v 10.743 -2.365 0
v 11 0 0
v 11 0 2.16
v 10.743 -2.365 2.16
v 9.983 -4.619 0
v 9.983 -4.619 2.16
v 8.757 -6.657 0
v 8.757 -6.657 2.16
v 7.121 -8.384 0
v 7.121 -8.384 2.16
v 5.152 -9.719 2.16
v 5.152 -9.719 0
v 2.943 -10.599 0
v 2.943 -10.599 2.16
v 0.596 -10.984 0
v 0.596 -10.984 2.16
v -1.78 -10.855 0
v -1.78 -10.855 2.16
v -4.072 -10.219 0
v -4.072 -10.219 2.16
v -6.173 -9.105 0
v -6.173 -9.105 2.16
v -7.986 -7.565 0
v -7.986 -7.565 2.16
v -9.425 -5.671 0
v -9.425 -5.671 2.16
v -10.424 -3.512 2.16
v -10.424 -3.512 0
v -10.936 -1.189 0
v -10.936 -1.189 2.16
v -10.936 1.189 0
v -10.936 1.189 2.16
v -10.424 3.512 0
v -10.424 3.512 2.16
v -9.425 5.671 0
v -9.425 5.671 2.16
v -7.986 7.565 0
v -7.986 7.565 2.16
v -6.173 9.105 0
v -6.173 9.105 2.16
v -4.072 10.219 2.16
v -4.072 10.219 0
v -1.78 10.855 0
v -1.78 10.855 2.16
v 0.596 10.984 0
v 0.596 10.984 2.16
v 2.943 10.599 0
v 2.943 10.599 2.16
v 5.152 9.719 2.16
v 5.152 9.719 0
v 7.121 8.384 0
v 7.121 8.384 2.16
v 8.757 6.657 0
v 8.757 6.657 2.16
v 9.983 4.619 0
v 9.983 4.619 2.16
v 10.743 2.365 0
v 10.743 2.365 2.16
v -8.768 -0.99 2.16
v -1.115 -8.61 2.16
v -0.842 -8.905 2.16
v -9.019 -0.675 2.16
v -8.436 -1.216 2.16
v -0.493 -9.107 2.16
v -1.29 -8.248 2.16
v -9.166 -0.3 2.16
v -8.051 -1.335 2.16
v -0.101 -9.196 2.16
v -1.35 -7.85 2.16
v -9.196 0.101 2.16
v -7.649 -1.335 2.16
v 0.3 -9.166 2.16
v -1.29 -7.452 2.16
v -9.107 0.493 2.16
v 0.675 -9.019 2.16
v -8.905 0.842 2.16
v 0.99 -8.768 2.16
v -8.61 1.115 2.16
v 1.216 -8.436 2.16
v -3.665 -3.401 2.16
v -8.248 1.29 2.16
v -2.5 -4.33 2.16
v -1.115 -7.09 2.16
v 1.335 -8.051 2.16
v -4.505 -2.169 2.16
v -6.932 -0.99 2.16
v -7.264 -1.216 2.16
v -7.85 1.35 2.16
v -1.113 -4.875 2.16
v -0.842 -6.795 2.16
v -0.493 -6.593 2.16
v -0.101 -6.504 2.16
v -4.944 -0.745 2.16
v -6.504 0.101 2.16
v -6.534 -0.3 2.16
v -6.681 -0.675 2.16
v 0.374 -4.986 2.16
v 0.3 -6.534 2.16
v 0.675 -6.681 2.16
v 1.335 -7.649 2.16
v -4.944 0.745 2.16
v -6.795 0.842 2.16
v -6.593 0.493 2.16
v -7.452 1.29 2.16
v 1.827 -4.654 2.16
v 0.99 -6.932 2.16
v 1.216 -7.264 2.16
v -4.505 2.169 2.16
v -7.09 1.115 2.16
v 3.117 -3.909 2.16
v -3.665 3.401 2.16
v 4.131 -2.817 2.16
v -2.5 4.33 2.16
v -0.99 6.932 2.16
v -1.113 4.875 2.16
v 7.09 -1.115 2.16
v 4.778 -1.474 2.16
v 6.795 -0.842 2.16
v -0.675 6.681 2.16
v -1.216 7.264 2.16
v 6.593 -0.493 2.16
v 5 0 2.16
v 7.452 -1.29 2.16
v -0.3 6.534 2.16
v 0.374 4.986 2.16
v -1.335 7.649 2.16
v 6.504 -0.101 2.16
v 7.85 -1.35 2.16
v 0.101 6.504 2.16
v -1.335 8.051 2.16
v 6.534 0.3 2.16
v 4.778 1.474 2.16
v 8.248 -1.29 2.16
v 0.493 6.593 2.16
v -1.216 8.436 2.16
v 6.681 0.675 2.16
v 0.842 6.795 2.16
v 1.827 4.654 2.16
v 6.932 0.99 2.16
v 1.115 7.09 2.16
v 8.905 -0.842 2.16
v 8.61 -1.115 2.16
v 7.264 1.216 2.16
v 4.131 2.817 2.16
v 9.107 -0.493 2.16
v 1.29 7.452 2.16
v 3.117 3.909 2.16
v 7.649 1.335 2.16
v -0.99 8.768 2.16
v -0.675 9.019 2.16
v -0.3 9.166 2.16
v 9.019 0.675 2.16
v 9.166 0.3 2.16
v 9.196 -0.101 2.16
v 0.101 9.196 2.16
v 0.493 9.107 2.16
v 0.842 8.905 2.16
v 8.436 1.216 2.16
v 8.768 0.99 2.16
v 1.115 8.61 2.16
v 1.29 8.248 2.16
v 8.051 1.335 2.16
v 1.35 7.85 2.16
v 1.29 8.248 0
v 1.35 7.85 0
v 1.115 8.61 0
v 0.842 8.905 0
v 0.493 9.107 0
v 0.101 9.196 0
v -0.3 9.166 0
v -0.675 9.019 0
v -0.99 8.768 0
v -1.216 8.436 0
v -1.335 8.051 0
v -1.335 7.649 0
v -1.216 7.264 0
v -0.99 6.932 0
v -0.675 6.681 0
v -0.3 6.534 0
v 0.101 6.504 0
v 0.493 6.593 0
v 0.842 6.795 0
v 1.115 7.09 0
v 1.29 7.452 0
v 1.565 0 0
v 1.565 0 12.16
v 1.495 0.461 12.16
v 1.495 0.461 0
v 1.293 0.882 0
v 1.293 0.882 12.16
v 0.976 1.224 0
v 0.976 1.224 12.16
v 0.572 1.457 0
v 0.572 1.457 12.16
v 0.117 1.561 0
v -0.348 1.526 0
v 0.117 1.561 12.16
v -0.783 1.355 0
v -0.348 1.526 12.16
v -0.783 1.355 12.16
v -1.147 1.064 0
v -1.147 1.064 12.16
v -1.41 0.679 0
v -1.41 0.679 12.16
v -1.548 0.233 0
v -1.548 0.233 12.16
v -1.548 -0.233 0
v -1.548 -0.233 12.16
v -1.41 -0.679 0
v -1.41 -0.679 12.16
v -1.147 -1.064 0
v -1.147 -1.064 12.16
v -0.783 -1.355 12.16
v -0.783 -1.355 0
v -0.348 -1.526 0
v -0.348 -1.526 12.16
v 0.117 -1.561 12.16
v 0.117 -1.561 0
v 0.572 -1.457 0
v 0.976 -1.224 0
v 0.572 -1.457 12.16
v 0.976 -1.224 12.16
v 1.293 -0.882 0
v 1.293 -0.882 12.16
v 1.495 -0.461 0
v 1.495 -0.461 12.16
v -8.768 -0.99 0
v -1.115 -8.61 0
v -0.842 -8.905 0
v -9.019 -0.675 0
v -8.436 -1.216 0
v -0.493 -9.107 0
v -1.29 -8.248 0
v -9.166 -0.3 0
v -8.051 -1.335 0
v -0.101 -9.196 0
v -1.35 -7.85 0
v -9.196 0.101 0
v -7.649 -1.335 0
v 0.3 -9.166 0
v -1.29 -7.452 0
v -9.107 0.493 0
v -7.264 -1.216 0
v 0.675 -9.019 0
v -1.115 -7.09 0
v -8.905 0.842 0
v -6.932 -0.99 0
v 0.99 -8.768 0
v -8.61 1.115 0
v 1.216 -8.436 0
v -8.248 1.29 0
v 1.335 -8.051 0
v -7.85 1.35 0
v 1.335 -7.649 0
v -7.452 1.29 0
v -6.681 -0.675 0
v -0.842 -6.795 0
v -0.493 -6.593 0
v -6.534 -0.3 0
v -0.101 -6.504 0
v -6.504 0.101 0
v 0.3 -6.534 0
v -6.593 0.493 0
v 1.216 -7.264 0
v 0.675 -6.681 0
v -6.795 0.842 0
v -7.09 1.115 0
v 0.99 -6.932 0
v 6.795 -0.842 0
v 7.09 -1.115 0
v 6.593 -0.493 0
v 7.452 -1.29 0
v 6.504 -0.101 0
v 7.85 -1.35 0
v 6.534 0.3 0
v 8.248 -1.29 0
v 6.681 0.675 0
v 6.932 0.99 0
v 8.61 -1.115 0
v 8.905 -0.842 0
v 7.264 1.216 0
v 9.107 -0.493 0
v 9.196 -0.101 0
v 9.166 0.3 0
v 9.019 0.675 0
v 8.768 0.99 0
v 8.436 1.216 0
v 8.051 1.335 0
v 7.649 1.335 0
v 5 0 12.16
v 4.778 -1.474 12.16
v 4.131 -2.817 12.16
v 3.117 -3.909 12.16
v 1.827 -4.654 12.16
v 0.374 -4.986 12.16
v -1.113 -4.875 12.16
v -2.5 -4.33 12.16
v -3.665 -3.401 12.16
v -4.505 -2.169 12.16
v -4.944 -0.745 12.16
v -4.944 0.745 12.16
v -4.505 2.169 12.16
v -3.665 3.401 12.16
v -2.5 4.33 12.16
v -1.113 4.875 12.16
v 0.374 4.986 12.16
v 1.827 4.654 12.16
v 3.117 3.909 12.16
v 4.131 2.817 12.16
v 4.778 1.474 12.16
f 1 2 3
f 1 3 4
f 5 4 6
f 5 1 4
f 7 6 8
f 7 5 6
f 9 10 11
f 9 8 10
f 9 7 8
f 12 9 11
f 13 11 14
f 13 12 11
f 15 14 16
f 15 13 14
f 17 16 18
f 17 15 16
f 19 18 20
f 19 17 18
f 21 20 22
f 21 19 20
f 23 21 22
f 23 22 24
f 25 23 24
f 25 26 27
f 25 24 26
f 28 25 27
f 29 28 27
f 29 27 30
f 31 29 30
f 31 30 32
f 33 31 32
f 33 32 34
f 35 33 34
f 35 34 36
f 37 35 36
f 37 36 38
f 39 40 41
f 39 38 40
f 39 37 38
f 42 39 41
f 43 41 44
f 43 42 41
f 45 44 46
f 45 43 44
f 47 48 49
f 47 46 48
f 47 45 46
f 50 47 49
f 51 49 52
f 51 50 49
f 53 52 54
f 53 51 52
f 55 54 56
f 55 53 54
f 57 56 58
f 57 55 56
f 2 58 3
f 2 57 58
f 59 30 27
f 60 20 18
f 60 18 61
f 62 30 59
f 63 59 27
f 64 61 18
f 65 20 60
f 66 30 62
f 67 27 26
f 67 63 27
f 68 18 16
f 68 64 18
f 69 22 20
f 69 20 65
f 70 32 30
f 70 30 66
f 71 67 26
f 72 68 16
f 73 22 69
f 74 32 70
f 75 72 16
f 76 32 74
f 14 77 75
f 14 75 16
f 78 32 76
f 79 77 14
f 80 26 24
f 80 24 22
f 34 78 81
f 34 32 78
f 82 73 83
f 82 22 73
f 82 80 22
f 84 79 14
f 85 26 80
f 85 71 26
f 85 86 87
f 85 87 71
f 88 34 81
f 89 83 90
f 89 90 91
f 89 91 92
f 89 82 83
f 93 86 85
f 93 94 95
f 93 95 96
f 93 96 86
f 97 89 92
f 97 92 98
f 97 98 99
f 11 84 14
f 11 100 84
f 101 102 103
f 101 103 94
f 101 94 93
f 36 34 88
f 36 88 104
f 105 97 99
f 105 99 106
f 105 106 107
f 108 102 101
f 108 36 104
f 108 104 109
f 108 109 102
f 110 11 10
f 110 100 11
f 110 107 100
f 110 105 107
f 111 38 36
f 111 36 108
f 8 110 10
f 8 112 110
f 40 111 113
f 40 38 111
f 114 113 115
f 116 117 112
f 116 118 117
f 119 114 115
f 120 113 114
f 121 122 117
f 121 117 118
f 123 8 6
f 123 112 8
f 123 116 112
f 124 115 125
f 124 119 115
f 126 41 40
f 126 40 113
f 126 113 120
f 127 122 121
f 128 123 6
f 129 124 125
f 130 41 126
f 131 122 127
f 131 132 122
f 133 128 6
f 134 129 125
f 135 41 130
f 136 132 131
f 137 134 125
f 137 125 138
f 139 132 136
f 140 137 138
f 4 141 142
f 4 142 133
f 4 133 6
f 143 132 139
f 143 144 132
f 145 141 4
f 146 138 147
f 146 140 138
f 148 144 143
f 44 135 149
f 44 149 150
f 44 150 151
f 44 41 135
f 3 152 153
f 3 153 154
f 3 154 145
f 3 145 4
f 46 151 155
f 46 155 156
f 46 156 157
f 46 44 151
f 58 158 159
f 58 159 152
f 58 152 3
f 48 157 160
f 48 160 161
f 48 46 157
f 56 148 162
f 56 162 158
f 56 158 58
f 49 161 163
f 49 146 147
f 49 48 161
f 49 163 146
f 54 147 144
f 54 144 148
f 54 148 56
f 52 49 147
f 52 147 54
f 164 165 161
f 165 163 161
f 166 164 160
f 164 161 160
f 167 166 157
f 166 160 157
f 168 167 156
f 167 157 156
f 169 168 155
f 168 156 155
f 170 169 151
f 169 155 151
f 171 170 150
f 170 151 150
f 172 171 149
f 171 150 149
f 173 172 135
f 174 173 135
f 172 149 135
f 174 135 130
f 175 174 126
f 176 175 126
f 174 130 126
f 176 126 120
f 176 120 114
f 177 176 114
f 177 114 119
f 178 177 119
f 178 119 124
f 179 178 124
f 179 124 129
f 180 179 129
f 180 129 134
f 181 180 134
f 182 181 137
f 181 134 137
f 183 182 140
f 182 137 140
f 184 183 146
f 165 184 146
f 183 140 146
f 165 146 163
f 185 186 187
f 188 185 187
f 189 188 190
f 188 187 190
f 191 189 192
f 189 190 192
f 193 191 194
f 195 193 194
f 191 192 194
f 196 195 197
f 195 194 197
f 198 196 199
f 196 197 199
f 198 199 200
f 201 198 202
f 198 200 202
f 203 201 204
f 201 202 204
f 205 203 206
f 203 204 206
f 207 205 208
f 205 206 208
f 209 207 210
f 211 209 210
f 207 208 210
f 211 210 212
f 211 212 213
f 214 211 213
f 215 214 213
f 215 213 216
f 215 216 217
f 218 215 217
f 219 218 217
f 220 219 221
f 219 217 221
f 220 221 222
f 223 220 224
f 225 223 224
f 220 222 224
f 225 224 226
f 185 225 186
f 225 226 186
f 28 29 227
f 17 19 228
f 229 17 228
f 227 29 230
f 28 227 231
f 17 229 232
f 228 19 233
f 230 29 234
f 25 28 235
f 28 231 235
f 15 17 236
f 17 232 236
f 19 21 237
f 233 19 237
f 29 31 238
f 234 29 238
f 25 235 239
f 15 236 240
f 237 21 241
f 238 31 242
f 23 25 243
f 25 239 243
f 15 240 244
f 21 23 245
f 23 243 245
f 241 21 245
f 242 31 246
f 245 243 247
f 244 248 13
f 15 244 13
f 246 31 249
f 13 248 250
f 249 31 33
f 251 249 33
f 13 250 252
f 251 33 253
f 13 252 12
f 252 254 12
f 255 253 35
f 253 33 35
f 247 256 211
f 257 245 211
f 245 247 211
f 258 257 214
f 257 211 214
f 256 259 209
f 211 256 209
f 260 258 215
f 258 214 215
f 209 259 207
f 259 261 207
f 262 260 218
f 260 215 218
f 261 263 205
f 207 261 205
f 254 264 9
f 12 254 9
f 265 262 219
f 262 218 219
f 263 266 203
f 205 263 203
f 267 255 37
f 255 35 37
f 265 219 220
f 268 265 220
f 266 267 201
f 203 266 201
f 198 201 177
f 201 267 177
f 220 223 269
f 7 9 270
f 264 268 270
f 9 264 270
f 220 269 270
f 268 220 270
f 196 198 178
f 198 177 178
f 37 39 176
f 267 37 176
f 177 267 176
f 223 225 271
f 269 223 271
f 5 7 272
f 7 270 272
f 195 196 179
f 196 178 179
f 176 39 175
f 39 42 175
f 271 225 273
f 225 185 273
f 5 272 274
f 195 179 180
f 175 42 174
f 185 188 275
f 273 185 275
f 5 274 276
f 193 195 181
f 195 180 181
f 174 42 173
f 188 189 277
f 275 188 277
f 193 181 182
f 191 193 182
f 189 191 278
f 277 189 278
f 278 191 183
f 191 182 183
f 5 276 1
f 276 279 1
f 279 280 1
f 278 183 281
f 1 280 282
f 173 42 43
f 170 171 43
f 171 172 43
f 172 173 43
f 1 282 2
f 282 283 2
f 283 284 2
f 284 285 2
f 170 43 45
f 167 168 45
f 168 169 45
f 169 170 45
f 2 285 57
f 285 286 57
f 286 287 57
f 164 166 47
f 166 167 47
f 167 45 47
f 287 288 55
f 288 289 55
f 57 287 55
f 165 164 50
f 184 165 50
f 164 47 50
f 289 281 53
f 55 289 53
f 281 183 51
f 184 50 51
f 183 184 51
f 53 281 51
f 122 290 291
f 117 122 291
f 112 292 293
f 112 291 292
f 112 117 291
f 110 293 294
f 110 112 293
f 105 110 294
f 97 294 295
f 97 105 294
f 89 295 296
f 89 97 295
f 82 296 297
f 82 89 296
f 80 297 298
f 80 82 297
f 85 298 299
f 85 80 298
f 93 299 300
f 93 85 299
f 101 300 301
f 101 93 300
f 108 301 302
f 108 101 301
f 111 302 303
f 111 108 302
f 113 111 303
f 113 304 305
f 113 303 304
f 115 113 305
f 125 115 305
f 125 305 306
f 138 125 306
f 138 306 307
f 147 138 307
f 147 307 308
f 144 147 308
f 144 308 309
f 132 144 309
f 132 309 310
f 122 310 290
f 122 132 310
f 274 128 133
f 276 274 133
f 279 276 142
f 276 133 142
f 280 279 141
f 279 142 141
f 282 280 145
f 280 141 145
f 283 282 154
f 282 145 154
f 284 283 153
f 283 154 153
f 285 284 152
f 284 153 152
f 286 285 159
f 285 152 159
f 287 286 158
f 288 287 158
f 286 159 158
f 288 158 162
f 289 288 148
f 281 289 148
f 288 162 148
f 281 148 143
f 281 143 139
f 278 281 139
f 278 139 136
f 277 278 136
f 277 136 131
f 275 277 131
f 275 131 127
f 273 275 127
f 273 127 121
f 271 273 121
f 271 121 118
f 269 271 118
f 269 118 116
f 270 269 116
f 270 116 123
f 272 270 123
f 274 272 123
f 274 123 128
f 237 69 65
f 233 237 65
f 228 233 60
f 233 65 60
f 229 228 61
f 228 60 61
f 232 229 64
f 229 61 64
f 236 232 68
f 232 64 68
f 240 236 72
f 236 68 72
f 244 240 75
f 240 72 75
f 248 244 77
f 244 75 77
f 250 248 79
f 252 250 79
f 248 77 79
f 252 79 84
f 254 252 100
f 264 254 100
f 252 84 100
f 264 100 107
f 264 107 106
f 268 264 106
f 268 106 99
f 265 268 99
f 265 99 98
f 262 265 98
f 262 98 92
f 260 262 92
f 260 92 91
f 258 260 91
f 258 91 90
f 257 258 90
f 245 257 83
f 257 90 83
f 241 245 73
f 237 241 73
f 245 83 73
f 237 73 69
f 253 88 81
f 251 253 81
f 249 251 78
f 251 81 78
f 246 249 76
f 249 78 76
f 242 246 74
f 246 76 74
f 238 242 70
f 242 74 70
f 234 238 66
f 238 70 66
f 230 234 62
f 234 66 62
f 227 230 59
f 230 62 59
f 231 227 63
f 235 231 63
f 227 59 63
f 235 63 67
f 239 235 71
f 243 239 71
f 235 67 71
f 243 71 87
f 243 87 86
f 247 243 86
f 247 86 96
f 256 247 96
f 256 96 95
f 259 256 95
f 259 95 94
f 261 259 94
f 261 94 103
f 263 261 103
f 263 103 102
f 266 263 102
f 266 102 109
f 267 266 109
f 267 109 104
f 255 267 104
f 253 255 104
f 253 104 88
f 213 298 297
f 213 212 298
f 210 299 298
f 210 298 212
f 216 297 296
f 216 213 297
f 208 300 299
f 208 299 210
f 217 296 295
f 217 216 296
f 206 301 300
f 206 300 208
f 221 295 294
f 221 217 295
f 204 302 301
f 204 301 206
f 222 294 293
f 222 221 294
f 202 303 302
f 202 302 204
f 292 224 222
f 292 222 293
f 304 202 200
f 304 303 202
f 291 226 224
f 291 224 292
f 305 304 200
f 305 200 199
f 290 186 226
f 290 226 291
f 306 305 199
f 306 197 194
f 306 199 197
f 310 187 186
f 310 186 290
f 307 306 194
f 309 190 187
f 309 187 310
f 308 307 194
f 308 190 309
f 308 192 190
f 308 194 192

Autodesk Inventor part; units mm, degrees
ref_plane "YZ Plane" through (0, 0, 0) normal (1, 0, 0) x (0, 1, 0)
ref_plane "XZ Plane" through (0, 0, 0) normal (0, 1, 0) x (-1, 0, 0)
ref_plane "XY Plane" through (0, 0, 0) normal (0, 0, 1) x (1, 0, 0)
sketch "スケッチ1" plane through (0, 0, 0) normal (0, 0, 1) x (1, 0, 0)
  circle A0 centre (0, 0) radius 11
  dimension "d0" = 22
extrude "押し出し1" add sketch "スケッチ1" along normal blind 2.16
sketch "スケッチ2" plane through (0, 0, 2.16) normal (0, 0, 1) x (1, 0, 0)
  circle A0 centre (0, 0) radius 5
  dimension "d3" = 10
extrude "押し出し2" add sketch "スケッチ2" along normal blind 10
sketch "スケッチ3" plane through (0, 0, 12.16) normal (0, 0, 1) x (1, 0, 0)
  circle A0 centre (0, 0) radius 1.565
  dimension "d6" = 3.13
extrude "押し出し3" cut sketch "スケッチ3" against normal up to surface (12.16 mm away)
sketch "スケッチ4" plane through (0, 0, 2.16) normal (0, 0, 1) x (1, 0, 0)
  circle A0 centre (0, 7.85) radius 1.35
  line L0 (0, -15.7768) -> (0, 17.6611) projected
  point P0 (0, 0)
  point P1 (0, 6.5)
  dimension "d9" = 2.7
  dimension "d10" = 6.5
extrude "押し出し4" cut sketch "スケッチ4" against normal up to surface (2.16 mm away)
pattern_circular "円形状パターン1" count 4 over 360 about axis through (0, 0, -10) along (0, 0, 1) of "押し出し4"
properties part number "frange"
